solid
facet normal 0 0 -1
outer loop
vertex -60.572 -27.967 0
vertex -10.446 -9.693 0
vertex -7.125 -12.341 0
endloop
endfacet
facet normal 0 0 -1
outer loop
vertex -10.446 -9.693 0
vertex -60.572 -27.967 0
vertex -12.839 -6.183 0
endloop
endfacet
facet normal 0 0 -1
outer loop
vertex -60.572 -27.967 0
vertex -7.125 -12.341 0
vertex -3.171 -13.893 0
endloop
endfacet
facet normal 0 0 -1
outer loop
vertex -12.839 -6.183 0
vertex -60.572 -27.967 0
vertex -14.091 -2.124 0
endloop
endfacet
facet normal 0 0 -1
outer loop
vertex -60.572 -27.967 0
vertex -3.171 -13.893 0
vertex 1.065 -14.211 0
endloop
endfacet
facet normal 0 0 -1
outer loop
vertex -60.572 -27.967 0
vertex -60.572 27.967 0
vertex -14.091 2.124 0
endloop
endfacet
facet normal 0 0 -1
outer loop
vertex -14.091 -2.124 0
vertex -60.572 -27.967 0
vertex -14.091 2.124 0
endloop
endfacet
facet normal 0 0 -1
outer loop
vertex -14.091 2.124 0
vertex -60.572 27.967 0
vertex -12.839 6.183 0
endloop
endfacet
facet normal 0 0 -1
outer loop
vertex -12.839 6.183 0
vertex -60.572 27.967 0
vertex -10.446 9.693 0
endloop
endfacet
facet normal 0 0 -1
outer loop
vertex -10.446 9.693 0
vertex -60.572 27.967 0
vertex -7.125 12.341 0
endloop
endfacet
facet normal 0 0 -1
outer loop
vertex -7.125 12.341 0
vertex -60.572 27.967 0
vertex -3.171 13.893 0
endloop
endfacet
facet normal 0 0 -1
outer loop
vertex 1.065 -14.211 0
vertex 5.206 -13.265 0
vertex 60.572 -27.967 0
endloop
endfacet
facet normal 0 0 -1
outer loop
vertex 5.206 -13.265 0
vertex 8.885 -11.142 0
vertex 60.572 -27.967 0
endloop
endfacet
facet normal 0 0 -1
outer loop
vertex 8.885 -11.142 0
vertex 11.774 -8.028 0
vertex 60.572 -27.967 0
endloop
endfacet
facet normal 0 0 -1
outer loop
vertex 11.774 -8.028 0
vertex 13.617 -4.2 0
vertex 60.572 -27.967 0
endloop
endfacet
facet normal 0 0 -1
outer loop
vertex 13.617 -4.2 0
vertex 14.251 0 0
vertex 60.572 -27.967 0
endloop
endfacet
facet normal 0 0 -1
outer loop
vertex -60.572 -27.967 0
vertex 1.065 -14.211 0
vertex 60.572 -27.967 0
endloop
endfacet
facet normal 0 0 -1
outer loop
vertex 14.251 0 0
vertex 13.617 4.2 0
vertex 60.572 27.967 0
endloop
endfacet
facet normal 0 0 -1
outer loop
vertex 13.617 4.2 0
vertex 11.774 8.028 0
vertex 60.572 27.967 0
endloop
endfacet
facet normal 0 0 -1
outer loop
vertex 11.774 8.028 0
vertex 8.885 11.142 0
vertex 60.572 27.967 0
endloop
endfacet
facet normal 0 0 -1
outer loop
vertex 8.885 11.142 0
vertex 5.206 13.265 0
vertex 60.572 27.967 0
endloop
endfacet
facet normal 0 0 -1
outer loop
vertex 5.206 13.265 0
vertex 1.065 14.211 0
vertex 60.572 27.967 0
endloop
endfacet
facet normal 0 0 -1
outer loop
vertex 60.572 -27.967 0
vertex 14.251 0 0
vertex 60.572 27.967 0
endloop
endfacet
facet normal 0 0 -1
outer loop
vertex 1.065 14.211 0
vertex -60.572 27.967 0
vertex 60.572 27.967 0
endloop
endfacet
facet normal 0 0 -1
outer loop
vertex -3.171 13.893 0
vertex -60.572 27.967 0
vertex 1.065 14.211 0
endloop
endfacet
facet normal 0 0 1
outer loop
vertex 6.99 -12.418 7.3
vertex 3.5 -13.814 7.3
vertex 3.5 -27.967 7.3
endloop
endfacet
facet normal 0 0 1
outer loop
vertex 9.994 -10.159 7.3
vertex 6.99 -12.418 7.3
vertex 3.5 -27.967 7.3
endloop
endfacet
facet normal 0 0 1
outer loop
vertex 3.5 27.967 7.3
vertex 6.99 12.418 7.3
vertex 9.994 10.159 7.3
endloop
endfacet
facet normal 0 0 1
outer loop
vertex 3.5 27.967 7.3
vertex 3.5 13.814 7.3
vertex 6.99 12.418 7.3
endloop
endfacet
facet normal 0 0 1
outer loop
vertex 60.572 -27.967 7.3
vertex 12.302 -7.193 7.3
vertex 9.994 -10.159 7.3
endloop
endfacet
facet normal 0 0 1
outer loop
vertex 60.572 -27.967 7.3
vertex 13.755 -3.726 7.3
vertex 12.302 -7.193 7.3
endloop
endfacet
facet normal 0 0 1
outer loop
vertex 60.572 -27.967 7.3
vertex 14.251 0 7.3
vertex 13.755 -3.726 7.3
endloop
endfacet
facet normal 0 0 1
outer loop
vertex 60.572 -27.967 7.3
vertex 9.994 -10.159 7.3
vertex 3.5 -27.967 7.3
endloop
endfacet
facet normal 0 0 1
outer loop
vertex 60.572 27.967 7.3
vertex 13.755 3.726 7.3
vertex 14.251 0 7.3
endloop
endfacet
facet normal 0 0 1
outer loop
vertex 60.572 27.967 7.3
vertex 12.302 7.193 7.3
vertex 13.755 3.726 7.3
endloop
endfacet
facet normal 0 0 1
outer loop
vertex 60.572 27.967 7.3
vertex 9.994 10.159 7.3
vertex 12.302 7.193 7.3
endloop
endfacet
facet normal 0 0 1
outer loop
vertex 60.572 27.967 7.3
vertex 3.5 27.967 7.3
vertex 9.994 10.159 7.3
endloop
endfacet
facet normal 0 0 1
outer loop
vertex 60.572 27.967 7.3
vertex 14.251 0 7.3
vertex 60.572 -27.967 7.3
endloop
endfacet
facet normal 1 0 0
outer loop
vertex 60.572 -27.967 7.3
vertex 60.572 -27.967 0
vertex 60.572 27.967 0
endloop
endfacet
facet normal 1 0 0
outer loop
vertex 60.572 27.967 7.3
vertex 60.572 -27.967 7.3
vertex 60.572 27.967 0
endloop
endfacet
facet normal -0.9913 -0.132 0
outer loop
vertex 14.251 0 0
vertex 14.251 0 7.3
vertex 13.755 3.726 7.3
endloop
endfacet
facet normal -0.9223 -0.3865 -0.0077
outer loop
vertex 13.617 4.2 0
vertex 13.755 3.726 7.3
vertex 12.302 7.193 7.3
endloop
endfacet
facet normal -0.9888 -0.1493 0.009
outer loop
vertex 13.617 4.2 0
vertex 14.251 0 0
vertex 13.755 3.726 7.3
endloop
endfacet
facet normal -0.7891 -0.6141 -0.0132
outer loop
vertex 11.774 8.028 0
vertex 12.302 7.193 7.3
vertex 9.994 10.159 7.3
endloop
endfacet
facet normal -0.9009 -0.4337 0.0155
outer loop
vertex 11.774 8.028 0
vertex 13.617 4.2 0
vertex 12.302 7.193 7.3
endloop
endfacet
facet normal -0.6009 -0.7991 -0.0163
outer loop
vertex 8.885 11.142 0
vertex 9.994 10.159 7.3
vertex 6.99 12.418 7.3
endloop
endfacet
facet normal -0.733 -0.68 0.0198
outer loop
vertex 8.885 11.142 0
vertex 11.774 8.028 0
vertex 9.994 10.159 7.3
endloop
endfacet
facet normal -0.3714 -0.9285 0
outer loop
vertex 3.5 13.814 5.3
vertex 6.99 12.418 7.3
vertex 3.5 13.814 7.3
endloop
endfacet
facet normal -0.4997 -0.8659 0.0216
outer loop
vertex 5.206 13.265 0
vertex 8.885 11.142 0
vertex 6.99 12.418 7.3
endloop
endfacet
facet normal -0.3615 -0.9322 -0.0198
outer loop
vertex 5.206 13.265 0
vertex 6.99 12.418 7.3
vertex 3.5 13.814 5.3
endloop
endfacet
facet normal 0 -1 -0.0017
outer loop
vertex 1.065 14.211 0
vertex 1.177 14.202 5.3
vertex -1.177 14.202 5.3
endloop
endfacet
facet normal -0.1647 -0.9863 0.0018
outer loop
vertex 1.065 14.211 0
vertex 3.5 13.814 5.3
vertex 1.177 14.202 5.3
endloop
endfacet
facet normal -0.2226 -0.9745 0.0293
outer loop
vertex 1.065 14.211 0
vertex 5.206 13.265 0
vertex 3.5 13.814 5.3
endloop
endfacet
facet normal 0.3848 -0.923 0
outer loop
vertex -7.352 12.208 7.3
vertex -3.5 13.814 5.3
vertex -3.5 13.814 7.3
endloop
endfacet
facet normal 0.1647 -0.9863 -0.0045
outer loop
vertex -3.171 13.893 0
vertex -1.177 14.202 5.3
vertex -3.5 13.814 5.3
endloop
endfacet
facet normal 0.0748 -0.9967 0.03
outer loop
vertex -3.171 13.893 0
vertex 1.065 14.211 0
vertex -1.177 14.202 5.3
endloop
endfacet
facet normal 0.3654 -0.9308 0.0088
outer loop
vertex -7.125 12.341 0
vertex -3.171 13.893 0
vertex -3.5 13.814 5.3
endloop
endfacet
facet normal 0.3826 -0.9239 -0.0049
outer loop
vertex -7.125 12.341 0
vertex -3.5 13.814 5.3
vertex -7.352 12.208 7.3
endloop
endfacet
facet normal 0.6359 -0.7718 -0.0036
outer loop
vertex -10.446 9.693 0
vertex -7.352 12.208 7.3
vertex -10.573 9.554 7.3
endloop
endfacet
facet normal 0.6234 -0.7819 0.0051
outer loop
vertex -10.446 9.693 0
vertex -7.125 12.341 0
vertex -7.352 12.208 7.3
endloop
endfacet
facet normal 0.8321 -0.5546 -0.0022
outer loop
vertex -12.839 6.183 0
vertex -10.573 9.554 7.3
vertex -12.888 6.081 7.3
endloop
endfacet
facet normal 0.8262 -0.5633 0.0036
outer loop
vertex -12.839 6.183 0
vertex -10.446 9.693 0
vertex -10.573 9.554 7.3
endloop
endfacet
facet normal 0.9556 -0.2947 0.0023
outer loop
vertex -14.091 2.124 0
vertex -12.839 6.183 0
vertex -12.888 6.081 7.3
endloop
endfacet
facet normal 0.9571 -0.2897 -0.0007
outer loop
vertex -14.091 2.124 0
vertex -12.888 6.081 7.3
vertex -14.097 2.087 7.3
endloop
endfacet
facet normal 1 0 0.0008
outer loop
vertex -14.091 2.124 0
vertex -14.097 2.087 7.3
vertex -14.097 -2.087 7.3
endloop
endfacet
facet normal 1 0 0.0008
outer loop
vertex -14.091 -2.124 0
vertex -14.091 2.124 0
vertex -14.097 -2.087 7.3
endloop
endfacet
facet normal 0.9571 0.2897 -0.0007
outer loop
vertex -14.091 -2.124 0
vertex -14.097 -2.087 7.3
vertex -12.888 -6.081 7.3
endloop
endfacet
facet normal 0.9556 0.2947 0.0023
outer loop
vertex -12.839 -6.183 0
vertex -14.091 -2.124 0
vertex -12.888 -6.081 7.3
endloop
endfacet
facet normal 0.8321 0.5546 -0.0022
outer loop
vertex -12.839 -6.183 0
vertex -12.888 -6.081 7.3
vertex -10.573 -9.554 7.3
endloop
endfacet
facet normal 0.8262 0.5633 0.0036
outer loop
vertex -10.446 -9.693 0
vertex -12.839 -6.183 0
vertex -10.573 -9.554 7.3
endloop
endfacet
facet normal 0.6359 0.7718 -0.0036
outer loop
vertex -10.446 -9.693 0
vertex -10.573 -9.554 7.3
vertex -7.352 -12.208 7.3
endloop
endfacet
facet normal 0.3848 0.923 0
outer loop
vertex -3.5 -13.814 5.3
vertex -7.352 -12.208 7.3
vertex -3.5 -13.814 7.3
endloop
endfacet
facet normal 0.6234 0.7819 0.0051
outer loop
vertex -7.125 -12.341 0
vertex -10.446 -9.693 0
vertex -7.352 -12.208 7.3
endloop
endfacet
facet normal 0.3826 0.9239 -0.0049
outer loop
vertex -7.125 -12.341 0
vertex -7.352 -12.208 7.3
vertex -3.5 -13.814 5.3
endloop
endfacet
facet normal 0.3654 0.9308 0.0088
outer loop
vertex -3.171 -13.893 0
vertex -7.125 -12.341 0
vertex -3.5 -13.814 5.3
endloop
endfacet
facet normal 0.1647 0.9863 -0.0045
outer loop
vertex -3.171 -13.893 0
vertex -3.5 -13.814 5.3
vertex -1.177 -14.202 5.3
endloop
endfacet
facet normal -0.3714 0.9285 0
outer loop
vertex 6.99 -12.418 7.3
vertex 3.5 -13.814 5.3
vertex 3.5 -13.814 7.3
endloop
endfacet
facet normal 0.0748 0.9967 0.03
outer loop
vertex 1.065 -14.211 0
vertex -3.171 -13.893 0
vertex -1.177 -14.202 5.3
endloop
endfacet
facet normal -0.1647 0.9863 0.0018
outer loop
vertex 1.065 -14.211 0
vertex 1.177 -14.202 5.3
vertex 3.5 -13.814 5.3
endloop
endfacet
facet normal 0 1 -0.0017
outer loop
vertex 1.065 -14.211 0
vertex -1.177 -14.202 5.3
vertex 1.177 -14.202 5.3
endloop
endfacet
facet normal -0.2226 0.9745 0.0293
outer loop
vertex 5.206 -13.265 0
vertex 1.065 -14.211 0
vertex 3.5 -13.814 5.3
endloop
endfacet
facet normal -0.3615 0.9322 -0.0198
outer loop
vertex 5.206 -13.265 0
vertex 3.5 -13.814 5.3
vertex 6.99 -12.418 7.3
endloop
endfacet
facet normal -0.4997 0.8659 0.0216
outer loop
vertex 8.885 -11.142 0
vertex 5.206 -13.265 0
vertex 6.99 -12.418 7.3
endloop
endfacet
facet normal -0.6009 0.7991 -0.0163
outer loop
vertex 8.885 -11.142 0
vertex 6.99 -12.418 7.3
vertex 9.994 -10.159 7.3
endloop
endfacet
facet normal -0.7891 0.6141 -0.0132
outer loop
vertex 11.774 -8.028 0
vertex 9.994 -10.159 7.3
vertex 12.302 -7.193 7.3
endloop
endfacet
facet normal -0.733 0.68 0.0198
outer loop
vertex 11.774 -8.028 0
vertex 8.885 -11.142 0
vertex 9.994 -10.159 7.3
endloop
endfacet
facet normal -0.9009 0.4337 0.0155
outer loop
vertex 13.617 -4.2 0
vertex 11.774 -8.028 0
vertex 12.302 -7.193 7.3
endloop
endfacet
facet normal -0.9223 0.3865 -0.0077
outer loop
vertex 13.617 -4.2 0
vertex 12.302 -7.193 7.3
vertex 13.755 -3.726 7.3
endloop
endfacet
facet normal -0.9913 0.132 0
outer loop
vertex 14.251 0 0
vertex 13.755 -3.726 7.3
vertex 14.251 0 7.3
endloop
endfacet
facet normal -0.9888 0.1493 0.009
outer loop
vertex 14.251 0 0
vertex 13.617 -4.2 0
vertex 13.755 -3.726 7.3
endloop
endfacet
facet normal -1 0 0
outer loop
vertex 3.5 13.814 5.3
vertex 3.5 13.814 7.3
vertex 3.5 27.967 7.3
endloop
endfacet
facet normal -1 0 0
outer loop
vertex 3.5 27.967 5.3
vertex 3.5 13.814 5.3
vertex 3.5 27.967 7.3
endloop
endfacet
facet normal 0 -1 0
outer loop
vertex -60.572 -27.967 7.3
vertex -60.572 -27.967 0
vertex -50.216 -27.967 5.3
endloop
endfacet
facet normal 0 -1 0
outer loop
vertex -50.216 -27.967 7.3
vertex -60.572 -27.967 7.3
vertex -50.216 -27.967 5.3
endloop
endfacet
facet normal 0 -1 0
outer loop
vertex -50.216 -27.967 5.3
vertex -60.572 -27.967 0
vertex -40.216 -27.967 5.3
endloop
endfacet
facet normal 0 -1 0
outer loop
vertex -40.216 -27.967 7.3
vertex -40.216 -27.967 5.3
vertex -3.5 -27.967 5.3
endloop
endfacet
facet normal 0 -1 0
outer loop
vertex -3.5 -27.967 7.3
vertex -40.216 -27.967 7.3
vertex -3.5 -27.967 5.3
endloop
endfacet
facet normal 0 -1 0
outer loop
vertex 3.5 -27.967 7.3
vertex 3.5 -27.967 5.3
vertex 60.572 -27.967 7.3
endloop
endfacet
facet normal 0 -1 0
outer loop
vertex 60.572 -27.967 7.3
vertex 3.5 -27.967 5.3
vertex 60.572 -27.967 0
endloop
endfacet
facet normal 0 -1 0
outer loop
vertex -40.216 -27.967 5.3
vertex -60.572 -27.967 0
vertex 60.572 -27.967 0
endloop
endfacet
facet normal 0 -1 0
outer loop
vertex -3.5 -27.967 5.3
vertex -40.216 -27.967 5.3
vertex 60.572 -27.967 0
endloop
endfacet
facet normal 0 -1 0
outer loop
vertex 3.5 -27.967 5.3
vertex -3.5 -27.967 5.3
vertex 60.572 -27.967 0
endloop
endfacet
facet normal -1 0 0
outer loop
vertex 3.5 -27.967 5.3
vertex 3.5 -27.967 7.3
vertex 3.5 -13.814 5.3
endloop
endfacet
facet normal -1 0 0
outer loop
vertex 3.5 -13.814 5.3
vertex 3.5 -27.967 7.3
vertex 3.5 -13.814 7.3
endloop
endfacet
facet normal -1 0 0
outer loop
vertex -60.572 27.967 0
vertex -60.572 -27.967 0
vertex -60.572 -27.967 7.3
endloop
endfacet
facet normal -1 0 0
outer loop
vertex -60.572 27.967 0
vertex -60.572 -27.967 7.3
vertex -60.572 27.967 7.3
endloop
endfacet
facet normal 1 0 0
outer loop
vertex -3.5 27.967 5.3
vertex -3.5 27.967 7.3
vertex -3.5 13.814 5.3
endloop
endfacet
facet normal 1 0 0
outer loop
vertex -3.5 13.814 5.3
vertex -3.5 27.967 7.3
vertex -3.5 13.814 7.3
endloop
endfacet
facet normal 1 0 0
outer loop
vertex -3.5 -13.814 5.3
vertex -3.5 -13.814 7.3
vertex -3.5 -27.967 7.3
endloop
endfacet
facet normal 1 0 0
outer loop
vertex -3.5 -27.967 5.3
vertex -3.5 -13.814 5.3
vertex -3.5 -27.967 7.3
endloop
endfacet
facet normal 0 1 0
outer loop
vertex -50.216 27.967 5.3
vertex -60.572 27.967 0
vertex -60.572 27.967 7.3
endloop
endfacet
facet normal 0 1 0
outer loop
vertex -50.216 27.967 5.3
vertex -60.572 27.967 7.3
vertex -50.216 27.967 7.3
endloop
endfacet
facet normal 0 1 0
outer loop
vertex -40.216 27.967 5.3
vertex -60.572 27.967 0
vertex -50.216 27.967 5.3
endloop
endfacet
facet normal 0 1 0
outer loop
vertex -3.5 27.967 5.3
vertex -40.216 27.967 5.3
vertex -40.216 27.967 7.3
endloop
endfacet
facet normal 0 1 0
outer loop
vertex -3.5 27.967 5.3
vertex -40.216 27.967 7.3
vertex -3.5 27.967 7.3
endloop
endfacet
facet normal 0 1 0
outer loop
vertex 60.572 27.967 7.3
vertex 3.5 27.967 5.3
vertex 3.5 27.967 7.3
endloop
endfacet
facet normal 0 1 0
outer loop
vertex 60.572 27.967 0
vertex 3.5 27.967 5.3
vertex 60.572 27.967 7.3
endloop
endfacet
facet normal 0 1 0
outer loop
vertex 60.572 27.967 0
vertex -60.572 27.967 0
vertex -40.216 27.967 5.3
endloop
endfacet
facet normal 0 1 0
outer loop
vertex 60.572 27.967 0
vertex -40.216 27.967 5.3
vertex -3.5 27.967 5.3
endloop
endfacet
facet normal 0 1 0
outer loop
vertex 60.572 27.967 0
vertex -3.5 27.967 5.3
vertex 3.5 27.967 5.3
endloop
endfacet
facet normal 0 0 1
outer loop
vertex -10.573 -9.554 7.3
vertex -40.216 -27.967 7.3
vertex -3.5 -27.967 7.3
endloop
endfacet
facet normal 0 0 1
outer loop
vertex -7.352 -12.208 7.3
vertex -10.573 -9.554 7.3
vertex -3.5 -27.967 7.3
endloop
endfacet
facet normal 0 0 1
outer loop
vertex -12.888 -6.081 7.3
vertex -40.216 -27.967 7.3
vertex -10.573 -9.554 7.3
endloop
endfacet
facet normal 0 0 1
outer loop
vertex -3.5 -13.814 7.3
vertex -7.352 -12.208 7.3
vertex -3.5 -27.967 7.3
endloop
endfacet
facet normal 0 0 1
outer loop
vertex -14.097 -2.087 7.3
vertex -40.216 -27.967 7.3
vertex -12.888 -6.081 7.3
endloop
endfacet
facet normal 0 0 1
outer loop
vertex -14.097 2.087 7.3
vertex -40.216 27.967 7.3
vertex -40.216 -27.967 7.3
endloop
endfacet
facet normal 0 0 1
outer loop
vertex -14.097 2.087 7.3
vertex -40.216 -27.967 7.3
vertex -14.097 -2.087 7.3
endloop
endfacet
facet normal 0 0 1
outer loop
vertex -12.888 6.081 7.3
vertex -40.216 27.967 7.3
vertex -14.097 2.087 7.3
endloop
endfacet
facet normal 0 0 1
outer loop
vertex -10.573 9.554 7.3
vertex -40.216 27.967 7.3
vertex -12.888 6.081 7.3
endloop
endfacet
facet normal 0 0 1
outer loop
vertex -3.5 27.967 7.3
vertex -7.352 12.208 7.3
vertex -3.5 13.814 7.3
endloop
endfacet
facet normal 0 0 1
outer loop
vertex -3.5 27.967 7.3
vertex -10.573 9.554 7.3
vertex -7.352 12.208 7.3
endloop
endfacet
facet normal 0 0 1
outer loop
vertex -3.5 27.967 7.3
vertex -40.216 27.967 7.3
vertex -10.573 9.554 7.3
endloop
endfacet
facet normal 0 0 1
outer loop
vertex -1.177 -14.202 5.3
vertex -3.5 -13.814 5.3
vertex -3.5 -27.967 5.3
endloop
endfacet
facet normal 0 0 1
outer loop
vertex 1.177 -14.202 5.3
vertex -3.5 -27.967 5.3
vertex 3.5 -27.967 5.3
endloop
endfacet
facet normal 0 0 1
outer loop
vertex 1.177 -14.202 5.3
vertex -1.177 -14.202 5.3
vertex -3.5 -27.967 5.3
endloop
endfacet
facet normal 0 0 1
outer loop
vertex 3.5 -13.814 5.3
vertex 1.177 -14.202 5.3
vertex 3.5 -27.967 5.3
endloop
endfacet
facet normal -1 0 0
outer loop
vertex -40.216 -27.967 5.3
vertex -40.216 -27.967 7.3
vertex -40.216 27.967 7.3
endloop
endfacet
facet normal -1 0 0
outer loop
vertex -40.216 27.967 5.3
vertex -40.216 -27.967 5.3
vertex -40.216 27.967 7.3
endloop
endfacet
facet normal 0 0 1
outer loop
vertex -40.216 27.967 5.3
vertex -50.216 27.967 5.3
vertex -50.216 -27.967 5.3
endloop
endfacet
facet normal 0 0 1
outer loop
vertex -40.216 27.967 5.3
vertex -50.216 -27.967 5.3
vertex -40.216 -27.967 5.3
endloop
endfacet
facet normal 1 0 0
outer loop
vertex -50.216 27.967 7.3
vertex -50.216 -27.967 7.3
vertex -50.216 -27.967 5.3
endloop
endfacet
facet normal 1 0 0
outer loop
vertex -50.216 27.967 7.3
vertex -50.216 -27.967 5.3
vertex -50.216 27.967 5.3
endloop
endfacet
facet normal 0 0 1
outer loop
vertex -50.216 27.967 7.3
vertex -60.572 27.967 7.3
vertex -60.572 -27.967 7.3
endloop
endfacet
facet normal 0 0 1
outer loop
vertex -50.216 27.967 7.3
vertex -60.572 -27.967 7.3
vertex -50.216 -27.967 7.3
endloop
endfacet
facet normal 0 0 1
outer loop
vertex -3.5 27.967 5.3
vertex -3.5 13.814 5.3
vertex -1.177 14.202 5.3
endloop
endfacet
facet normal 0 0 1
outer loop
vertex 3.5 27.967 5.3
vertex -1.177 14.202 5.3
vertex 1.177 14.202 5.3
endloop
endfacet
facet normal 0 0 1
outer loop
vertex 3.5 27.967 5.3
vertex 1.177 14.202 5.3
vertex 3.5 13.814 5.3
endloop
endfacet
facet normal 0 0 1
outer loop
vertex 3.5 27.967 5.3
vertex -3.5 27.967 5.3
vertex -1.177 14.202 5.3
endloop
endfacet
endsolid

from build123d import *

# Parameters (mm, degrees)
F0_W     = 121.1435347795
F0_H     = 55.9340305626
F0_R     = 14.2505593298
F1_DEPTH = 7.3
F2_W     = 10
F2_H     = 55.9340305626
F3_DEPTH = 2


with BuildPart() as f1:
    # F0 (on Top) → F1 (new body)
    with BuildSketch(Plane.XY):
        Rectangle(F0_W, F0_H)
        Circle(F0_R, mode=Mode.SUBTRACT)
    extrude(amount=F1_DEPTH)

    # F2 (on face) → F3 (cut)
    with BuildSketch(Plane.XY.offset(7.3)):
        with BuildLine():
            Line((3.5, 27.9670152813), (-3.5, 27.9670152813))
            Line((-3.5, 27.9670152813), (-3.5, 13.8140667876))
            ThreePointArc((-3.5, 13.8140667876), (0, 14.2505593298), (3.5, 13.8140667876))
            Line((3.5, 13.8140667876), (3.5, 27.9670152813))
        make_face()
        with BuildLine():
            Line((-3.5, -13.8140667876), (-3.5, -27.9670152813))
            Line((-3.5, -27.9670152813), (3.5, -27.9670152813))
            Line((3.5, -27.9670152813), (3.5, -13.8140667876))
            ThreePointArc((3.5, -13.8140667876), (0, -14.2505593298), (-3.5, -13.8140667876))
        make_face()
        with Locations((-45.2155907452, 0)):
            Rectangle(F2_W, F2_H)
    extrude(amount=-F3_DEPTH, mode=Mode.SUBTRACT)


solid = f1.part
